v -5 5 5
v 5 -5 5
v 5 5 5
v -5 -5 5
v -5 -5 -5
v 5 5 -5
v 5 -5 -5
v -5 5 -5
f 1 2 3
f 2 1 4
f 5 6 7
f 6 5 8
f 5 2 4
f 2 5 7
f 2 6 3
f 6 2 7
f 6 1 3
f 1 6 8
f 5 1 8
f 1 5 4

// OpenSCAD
// A cube
// The first example in the shapes folder.
cube(10, center = true);
